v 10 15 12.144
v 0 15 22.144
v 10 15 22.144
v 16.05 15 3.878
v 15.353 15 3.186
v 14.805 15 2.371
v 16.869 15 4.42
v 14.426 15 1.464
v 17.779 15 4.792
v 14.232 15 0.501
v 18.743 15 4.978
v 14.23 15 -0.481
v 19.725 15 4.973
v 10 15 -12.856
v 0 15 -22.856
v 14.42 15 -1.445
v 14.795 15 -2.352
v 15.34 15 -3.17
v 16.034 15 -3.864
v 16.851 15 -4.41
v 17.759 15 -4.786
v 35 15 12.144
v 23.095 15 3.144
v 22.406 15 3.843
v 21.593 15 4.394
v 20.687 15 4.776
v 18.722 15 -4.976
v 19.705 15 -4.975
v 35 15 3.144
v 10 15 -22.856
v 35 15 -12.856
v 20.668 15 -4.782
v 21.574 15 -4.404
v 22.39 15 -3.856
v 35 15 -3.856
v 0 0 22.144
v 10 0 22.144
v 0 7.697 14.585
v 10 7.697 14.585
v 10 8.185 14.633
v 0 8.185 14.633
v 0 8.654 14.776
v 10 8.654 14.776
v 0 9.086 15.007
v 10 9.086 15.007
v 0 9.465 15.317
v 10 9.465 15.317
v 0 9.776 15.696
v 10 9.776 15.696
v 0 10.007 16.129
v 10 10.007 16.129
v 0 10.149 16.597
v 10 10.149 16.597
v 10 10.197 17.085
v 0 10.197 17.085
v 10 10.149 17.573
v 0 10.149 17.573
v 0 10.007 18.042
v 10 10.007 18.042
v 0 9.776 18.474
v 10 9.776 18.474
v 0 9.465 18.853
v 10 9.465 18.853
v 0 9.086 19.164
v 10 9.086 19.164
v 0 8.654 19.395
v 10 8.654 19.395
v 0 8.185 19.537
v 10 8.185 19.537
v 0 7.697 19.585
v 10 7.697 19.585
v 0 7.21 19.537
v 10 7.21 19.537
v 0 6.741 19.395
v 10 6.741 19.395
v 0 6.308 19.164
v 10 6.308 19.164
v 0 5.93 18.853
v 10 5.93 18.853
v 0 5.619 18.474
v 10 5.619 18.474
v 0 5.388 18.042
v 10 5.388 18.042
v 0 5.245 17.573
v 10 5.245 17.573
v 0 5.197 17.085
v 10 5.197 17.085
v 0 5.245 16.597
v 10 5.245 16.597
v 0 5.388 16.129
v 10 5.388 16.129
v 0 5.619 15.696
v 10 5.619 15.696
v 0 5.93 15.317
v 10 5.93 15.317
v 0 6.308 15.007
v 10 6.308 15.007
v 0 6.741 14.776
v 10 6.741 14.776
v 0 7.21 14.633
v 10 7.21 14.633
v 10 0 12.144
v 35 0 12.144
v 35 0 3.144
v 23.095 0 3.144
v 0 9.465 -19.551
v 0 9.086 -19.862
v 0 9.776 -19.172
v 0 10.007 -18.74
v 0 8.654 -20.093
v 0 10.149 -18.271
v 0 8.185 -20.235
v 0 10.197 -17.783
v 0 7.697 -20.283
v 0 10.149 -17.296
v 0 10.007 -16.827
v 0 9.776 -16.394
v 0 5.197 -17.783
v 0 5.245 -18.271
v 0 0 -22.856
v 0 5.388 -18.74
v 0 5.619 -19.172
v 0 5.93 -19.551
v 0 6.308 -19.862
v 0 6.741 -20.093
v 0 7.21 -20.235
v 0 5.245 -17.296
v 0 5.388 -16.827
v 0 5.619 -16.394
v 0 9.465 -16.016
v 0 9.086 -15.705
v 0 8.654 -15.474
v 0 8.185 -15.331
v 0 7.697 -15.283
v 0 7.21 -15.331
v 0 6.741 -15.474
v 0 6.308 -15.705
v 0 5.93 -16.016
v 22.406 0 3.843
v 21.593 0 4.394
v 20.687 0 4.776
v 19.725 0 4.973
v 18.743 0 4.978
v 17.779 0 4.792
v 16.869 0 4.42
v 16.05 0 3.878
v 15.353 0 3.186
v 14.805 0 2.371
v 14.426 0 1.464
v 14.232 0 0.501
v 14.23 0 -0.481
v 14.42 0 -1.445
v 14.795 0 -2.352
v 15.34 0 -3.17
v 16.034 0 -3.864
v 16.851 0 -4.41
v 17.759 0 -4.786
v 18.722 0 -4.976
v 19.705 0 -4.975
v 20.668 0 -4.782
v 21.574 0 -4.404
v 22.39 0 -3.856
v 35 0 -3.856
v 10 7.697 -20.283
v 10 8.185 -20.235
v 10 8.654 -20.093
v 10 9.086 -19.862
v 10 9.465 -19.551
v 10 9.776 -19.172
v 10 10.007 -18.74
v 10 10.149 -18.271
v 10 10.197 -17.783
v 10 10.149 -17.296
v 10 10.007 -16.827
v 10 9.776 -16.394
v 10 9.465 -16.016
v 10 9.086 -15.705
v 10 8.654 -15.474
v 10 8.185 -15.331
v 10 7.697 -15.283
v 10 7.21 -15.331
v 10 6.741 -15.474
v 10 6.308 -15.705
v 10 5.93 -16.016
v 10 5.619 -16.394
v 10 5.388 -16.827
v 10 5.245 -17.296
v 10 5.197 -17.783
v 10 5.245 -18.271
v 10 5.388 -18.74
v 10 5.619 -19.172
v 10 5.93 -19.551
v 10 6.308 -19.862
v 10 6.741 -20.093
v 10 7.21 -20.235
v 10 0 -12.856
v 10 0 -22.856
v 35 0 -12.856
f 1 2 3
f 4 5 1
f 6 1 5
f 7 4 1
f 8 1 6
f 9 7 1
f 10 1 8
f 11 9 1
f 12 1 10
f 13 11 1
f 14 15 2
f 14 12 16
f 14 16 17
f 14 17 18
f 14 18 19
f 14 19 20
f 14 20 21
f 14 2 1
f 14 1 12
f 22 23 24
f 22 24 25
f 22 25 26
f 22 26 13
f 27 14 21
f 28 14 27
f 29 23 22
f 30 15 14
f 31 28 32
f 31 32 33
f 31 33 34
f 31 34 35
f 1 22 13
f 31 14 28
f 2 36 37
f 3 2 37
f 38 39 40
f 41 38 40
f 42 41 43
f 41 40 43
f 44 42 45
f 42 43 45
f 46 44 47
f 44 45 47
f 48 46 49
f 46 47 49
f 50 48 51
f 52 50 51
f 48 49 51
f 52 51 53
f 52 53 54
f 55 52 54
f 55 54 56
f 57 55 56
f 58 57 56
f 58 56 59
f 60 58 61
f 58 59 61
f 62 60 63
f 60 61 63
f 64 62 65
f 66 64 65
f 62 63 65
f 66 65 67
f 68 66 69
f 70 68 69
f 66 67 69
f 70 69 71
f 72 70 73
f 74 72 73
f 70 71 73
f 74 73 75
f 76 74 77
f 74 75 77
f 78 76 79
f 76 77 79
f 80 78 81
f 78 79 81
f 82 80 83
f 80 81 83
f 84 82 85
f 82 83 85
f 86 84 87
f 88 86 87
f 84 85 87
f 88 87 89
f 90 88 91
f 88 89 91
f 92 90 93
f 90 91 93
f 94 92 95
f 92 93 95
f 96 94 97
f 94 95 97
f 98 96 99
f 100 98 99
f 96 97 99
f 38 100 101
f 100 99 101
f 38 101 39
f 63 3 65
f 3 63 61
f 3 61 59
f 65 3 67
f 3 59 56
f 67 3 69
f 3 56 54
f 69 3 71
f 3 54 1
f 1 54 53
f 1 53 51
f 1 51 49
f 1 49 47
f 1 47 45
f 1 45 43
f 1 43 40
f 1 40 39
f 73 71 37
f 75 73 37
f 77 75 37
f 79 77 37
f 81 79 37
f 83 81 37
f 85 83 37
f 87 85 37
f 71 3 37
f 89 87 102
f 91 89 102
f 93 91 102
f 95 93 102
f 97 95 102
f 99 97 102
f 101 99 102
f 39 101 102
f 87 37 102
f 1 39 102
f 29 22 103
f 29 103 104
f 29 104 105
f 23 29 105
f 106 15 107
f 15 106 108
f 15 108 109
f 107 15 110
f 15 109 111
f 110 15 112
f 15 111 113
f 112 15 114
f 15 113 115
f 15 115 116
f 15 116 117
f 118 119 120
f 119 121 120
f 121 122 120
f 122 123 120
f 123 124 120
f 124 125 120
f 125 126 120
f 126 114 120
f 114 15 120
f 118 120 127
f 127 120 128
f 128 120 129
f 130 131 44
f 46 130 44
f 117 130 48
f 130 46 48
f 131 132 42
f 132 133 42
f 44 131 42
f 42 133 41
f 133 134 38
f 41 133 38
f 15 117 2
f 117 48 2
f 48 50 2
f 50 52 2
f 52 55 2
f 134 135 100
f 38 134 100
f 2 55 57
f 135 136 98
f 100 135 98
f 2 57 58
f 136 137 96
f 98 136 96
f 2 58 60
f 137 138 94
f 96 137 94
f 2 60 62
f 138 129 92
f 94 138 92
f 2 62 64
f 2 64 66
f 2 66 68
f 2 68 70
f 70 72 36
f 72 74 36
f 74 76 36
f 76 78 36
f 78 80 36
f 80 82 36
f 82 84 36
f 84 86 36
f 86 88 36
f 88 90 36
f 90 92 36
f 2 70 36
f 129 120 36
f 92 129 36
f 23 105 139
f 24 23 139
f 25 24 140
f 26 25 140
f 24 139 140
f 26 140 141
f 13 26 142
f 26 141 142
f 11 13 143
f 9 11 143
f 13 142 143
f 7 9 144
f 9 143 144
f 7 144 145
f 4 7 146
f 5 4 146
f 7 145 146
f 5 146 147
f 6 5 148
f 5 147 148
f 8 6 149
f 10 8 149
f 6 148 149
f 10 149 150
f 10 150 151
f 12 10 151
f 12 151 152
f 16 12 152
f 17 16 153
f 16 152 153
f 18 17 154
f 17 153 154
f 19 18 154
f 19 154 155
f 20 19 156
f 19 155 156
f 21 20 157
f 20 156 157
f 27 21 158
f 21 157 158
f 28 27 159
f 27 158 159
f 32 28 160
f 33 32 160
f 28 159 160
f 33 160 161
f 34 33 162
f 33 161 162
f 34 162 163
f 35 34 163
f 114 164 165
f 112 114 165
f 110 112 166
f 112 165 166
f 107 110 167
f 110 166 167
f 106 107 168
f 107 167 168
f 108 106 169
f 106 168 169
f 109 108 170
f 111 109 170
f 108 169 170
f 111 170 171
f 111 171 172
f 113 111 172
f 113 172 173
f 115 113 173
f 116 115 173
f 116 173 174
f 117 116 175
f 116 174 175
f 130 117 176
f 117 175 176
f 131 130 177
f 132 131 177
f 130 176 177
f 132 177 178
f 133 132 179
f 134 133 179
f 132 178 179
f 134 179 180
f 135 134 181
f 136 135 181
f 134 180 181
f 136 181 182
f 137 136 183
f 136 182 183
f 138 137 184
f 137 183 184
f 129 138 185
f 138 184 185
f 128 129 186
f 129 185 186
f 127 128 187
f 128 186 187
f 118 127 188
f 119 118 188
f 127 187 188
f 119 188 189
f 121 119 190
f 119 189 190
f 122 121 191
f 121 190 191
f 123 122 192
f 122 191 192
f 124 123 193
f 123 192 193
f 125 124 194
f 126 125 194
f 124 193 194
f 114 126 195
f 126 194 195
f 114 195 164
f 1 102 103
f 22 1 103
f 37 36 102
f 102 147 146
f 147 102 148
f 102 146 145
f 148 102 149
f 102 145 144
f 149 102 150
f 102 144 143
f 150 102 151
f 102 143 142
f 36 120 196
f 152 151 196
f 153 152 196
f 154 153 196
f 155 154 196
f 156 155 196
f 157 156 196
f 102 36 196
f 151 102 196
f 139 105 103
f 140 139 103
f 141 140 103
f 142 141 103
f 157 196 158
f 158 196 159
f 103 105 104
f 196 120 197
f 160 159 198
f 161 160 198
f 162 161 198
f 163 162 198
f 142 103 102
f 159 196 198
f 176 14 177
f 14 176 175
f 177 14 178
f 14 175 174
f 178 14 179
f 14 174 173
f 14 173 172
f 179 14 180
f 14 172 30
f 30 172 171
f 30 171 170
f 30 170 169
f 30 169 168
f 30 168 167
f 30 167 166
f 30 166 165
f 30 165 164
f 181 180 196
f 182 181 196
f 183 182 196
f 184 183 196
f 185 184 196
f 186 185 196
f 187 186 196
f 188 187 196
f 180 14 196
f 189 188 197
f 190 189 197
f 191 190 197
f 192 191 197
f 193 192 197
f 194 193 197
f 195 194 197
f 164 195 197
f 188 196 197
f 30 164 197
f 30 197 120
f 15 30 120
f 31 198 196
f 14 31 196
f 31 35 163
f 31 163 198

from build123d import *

# Parameters (mm, degrees)
BOSS_EXTRUDE1_DEPTH = 15
SKETCH5_R           = 2.5
CUT_EXTRUDE1_DEPTH  = 10


with BuildPart() as part:
    # Sketch1 → Boss-Extrude1 (new body)
    with BuildSketch(Plane(origin=(0, 0, 0), x_dir=(1, 0, 0), z_dir=(0, 1, 0))):
        with BuildLine():
            Line((0, 22.856339564), (0, -22.143660436))
            Line((0, -22.143660436), (10, -22.143660436))
            Line((10, -22.143660436), (10, -12.143660436))
            Line((10, -12.143660436), (35, -12.143660436))
            Line((35, -12.143660436), (35, -3.143660436))
            Line((35, -3.143660436), (23.095240671, -3.143660436))
            ThreePointArc((23.095240671, -3.143660436), (14.232337293, -0.501428414), (22.389683957, 3.856339564))
            Line((22.389683957, 3.856339564), (35, 3.856339564))
            Line((35, 3.856339564), (35, 12.856339564))
            Line((35, 12.856339564), (10, 12.856339564))
            Line((10, 12.856339564), (10, 22.856339564))
            Line((10, 22.856339564), (0, 22.856339564))
        make_face()
    extrude(amount=BOSS_EXTRUDE1_DEPTH)

    # Sketch5 → Cut-Extrude1 (cut)
    with BuildSketch(Plane(origin=(10, 0, 0), x_dir=(0, 0, -1), z_dir=(1, 0, 0))):
        with Locations((-17.085223361, 7.697334505)):
            Circle(SKETCH5_R)
        with Locations((17.783324683, 7.697334505)):
            Circle(SKETCH5_R)
    extrude(amount=-CUT_EXTRUDE1_DEPTH, mode=Mode.SUBTRACT)


solid = part.part
